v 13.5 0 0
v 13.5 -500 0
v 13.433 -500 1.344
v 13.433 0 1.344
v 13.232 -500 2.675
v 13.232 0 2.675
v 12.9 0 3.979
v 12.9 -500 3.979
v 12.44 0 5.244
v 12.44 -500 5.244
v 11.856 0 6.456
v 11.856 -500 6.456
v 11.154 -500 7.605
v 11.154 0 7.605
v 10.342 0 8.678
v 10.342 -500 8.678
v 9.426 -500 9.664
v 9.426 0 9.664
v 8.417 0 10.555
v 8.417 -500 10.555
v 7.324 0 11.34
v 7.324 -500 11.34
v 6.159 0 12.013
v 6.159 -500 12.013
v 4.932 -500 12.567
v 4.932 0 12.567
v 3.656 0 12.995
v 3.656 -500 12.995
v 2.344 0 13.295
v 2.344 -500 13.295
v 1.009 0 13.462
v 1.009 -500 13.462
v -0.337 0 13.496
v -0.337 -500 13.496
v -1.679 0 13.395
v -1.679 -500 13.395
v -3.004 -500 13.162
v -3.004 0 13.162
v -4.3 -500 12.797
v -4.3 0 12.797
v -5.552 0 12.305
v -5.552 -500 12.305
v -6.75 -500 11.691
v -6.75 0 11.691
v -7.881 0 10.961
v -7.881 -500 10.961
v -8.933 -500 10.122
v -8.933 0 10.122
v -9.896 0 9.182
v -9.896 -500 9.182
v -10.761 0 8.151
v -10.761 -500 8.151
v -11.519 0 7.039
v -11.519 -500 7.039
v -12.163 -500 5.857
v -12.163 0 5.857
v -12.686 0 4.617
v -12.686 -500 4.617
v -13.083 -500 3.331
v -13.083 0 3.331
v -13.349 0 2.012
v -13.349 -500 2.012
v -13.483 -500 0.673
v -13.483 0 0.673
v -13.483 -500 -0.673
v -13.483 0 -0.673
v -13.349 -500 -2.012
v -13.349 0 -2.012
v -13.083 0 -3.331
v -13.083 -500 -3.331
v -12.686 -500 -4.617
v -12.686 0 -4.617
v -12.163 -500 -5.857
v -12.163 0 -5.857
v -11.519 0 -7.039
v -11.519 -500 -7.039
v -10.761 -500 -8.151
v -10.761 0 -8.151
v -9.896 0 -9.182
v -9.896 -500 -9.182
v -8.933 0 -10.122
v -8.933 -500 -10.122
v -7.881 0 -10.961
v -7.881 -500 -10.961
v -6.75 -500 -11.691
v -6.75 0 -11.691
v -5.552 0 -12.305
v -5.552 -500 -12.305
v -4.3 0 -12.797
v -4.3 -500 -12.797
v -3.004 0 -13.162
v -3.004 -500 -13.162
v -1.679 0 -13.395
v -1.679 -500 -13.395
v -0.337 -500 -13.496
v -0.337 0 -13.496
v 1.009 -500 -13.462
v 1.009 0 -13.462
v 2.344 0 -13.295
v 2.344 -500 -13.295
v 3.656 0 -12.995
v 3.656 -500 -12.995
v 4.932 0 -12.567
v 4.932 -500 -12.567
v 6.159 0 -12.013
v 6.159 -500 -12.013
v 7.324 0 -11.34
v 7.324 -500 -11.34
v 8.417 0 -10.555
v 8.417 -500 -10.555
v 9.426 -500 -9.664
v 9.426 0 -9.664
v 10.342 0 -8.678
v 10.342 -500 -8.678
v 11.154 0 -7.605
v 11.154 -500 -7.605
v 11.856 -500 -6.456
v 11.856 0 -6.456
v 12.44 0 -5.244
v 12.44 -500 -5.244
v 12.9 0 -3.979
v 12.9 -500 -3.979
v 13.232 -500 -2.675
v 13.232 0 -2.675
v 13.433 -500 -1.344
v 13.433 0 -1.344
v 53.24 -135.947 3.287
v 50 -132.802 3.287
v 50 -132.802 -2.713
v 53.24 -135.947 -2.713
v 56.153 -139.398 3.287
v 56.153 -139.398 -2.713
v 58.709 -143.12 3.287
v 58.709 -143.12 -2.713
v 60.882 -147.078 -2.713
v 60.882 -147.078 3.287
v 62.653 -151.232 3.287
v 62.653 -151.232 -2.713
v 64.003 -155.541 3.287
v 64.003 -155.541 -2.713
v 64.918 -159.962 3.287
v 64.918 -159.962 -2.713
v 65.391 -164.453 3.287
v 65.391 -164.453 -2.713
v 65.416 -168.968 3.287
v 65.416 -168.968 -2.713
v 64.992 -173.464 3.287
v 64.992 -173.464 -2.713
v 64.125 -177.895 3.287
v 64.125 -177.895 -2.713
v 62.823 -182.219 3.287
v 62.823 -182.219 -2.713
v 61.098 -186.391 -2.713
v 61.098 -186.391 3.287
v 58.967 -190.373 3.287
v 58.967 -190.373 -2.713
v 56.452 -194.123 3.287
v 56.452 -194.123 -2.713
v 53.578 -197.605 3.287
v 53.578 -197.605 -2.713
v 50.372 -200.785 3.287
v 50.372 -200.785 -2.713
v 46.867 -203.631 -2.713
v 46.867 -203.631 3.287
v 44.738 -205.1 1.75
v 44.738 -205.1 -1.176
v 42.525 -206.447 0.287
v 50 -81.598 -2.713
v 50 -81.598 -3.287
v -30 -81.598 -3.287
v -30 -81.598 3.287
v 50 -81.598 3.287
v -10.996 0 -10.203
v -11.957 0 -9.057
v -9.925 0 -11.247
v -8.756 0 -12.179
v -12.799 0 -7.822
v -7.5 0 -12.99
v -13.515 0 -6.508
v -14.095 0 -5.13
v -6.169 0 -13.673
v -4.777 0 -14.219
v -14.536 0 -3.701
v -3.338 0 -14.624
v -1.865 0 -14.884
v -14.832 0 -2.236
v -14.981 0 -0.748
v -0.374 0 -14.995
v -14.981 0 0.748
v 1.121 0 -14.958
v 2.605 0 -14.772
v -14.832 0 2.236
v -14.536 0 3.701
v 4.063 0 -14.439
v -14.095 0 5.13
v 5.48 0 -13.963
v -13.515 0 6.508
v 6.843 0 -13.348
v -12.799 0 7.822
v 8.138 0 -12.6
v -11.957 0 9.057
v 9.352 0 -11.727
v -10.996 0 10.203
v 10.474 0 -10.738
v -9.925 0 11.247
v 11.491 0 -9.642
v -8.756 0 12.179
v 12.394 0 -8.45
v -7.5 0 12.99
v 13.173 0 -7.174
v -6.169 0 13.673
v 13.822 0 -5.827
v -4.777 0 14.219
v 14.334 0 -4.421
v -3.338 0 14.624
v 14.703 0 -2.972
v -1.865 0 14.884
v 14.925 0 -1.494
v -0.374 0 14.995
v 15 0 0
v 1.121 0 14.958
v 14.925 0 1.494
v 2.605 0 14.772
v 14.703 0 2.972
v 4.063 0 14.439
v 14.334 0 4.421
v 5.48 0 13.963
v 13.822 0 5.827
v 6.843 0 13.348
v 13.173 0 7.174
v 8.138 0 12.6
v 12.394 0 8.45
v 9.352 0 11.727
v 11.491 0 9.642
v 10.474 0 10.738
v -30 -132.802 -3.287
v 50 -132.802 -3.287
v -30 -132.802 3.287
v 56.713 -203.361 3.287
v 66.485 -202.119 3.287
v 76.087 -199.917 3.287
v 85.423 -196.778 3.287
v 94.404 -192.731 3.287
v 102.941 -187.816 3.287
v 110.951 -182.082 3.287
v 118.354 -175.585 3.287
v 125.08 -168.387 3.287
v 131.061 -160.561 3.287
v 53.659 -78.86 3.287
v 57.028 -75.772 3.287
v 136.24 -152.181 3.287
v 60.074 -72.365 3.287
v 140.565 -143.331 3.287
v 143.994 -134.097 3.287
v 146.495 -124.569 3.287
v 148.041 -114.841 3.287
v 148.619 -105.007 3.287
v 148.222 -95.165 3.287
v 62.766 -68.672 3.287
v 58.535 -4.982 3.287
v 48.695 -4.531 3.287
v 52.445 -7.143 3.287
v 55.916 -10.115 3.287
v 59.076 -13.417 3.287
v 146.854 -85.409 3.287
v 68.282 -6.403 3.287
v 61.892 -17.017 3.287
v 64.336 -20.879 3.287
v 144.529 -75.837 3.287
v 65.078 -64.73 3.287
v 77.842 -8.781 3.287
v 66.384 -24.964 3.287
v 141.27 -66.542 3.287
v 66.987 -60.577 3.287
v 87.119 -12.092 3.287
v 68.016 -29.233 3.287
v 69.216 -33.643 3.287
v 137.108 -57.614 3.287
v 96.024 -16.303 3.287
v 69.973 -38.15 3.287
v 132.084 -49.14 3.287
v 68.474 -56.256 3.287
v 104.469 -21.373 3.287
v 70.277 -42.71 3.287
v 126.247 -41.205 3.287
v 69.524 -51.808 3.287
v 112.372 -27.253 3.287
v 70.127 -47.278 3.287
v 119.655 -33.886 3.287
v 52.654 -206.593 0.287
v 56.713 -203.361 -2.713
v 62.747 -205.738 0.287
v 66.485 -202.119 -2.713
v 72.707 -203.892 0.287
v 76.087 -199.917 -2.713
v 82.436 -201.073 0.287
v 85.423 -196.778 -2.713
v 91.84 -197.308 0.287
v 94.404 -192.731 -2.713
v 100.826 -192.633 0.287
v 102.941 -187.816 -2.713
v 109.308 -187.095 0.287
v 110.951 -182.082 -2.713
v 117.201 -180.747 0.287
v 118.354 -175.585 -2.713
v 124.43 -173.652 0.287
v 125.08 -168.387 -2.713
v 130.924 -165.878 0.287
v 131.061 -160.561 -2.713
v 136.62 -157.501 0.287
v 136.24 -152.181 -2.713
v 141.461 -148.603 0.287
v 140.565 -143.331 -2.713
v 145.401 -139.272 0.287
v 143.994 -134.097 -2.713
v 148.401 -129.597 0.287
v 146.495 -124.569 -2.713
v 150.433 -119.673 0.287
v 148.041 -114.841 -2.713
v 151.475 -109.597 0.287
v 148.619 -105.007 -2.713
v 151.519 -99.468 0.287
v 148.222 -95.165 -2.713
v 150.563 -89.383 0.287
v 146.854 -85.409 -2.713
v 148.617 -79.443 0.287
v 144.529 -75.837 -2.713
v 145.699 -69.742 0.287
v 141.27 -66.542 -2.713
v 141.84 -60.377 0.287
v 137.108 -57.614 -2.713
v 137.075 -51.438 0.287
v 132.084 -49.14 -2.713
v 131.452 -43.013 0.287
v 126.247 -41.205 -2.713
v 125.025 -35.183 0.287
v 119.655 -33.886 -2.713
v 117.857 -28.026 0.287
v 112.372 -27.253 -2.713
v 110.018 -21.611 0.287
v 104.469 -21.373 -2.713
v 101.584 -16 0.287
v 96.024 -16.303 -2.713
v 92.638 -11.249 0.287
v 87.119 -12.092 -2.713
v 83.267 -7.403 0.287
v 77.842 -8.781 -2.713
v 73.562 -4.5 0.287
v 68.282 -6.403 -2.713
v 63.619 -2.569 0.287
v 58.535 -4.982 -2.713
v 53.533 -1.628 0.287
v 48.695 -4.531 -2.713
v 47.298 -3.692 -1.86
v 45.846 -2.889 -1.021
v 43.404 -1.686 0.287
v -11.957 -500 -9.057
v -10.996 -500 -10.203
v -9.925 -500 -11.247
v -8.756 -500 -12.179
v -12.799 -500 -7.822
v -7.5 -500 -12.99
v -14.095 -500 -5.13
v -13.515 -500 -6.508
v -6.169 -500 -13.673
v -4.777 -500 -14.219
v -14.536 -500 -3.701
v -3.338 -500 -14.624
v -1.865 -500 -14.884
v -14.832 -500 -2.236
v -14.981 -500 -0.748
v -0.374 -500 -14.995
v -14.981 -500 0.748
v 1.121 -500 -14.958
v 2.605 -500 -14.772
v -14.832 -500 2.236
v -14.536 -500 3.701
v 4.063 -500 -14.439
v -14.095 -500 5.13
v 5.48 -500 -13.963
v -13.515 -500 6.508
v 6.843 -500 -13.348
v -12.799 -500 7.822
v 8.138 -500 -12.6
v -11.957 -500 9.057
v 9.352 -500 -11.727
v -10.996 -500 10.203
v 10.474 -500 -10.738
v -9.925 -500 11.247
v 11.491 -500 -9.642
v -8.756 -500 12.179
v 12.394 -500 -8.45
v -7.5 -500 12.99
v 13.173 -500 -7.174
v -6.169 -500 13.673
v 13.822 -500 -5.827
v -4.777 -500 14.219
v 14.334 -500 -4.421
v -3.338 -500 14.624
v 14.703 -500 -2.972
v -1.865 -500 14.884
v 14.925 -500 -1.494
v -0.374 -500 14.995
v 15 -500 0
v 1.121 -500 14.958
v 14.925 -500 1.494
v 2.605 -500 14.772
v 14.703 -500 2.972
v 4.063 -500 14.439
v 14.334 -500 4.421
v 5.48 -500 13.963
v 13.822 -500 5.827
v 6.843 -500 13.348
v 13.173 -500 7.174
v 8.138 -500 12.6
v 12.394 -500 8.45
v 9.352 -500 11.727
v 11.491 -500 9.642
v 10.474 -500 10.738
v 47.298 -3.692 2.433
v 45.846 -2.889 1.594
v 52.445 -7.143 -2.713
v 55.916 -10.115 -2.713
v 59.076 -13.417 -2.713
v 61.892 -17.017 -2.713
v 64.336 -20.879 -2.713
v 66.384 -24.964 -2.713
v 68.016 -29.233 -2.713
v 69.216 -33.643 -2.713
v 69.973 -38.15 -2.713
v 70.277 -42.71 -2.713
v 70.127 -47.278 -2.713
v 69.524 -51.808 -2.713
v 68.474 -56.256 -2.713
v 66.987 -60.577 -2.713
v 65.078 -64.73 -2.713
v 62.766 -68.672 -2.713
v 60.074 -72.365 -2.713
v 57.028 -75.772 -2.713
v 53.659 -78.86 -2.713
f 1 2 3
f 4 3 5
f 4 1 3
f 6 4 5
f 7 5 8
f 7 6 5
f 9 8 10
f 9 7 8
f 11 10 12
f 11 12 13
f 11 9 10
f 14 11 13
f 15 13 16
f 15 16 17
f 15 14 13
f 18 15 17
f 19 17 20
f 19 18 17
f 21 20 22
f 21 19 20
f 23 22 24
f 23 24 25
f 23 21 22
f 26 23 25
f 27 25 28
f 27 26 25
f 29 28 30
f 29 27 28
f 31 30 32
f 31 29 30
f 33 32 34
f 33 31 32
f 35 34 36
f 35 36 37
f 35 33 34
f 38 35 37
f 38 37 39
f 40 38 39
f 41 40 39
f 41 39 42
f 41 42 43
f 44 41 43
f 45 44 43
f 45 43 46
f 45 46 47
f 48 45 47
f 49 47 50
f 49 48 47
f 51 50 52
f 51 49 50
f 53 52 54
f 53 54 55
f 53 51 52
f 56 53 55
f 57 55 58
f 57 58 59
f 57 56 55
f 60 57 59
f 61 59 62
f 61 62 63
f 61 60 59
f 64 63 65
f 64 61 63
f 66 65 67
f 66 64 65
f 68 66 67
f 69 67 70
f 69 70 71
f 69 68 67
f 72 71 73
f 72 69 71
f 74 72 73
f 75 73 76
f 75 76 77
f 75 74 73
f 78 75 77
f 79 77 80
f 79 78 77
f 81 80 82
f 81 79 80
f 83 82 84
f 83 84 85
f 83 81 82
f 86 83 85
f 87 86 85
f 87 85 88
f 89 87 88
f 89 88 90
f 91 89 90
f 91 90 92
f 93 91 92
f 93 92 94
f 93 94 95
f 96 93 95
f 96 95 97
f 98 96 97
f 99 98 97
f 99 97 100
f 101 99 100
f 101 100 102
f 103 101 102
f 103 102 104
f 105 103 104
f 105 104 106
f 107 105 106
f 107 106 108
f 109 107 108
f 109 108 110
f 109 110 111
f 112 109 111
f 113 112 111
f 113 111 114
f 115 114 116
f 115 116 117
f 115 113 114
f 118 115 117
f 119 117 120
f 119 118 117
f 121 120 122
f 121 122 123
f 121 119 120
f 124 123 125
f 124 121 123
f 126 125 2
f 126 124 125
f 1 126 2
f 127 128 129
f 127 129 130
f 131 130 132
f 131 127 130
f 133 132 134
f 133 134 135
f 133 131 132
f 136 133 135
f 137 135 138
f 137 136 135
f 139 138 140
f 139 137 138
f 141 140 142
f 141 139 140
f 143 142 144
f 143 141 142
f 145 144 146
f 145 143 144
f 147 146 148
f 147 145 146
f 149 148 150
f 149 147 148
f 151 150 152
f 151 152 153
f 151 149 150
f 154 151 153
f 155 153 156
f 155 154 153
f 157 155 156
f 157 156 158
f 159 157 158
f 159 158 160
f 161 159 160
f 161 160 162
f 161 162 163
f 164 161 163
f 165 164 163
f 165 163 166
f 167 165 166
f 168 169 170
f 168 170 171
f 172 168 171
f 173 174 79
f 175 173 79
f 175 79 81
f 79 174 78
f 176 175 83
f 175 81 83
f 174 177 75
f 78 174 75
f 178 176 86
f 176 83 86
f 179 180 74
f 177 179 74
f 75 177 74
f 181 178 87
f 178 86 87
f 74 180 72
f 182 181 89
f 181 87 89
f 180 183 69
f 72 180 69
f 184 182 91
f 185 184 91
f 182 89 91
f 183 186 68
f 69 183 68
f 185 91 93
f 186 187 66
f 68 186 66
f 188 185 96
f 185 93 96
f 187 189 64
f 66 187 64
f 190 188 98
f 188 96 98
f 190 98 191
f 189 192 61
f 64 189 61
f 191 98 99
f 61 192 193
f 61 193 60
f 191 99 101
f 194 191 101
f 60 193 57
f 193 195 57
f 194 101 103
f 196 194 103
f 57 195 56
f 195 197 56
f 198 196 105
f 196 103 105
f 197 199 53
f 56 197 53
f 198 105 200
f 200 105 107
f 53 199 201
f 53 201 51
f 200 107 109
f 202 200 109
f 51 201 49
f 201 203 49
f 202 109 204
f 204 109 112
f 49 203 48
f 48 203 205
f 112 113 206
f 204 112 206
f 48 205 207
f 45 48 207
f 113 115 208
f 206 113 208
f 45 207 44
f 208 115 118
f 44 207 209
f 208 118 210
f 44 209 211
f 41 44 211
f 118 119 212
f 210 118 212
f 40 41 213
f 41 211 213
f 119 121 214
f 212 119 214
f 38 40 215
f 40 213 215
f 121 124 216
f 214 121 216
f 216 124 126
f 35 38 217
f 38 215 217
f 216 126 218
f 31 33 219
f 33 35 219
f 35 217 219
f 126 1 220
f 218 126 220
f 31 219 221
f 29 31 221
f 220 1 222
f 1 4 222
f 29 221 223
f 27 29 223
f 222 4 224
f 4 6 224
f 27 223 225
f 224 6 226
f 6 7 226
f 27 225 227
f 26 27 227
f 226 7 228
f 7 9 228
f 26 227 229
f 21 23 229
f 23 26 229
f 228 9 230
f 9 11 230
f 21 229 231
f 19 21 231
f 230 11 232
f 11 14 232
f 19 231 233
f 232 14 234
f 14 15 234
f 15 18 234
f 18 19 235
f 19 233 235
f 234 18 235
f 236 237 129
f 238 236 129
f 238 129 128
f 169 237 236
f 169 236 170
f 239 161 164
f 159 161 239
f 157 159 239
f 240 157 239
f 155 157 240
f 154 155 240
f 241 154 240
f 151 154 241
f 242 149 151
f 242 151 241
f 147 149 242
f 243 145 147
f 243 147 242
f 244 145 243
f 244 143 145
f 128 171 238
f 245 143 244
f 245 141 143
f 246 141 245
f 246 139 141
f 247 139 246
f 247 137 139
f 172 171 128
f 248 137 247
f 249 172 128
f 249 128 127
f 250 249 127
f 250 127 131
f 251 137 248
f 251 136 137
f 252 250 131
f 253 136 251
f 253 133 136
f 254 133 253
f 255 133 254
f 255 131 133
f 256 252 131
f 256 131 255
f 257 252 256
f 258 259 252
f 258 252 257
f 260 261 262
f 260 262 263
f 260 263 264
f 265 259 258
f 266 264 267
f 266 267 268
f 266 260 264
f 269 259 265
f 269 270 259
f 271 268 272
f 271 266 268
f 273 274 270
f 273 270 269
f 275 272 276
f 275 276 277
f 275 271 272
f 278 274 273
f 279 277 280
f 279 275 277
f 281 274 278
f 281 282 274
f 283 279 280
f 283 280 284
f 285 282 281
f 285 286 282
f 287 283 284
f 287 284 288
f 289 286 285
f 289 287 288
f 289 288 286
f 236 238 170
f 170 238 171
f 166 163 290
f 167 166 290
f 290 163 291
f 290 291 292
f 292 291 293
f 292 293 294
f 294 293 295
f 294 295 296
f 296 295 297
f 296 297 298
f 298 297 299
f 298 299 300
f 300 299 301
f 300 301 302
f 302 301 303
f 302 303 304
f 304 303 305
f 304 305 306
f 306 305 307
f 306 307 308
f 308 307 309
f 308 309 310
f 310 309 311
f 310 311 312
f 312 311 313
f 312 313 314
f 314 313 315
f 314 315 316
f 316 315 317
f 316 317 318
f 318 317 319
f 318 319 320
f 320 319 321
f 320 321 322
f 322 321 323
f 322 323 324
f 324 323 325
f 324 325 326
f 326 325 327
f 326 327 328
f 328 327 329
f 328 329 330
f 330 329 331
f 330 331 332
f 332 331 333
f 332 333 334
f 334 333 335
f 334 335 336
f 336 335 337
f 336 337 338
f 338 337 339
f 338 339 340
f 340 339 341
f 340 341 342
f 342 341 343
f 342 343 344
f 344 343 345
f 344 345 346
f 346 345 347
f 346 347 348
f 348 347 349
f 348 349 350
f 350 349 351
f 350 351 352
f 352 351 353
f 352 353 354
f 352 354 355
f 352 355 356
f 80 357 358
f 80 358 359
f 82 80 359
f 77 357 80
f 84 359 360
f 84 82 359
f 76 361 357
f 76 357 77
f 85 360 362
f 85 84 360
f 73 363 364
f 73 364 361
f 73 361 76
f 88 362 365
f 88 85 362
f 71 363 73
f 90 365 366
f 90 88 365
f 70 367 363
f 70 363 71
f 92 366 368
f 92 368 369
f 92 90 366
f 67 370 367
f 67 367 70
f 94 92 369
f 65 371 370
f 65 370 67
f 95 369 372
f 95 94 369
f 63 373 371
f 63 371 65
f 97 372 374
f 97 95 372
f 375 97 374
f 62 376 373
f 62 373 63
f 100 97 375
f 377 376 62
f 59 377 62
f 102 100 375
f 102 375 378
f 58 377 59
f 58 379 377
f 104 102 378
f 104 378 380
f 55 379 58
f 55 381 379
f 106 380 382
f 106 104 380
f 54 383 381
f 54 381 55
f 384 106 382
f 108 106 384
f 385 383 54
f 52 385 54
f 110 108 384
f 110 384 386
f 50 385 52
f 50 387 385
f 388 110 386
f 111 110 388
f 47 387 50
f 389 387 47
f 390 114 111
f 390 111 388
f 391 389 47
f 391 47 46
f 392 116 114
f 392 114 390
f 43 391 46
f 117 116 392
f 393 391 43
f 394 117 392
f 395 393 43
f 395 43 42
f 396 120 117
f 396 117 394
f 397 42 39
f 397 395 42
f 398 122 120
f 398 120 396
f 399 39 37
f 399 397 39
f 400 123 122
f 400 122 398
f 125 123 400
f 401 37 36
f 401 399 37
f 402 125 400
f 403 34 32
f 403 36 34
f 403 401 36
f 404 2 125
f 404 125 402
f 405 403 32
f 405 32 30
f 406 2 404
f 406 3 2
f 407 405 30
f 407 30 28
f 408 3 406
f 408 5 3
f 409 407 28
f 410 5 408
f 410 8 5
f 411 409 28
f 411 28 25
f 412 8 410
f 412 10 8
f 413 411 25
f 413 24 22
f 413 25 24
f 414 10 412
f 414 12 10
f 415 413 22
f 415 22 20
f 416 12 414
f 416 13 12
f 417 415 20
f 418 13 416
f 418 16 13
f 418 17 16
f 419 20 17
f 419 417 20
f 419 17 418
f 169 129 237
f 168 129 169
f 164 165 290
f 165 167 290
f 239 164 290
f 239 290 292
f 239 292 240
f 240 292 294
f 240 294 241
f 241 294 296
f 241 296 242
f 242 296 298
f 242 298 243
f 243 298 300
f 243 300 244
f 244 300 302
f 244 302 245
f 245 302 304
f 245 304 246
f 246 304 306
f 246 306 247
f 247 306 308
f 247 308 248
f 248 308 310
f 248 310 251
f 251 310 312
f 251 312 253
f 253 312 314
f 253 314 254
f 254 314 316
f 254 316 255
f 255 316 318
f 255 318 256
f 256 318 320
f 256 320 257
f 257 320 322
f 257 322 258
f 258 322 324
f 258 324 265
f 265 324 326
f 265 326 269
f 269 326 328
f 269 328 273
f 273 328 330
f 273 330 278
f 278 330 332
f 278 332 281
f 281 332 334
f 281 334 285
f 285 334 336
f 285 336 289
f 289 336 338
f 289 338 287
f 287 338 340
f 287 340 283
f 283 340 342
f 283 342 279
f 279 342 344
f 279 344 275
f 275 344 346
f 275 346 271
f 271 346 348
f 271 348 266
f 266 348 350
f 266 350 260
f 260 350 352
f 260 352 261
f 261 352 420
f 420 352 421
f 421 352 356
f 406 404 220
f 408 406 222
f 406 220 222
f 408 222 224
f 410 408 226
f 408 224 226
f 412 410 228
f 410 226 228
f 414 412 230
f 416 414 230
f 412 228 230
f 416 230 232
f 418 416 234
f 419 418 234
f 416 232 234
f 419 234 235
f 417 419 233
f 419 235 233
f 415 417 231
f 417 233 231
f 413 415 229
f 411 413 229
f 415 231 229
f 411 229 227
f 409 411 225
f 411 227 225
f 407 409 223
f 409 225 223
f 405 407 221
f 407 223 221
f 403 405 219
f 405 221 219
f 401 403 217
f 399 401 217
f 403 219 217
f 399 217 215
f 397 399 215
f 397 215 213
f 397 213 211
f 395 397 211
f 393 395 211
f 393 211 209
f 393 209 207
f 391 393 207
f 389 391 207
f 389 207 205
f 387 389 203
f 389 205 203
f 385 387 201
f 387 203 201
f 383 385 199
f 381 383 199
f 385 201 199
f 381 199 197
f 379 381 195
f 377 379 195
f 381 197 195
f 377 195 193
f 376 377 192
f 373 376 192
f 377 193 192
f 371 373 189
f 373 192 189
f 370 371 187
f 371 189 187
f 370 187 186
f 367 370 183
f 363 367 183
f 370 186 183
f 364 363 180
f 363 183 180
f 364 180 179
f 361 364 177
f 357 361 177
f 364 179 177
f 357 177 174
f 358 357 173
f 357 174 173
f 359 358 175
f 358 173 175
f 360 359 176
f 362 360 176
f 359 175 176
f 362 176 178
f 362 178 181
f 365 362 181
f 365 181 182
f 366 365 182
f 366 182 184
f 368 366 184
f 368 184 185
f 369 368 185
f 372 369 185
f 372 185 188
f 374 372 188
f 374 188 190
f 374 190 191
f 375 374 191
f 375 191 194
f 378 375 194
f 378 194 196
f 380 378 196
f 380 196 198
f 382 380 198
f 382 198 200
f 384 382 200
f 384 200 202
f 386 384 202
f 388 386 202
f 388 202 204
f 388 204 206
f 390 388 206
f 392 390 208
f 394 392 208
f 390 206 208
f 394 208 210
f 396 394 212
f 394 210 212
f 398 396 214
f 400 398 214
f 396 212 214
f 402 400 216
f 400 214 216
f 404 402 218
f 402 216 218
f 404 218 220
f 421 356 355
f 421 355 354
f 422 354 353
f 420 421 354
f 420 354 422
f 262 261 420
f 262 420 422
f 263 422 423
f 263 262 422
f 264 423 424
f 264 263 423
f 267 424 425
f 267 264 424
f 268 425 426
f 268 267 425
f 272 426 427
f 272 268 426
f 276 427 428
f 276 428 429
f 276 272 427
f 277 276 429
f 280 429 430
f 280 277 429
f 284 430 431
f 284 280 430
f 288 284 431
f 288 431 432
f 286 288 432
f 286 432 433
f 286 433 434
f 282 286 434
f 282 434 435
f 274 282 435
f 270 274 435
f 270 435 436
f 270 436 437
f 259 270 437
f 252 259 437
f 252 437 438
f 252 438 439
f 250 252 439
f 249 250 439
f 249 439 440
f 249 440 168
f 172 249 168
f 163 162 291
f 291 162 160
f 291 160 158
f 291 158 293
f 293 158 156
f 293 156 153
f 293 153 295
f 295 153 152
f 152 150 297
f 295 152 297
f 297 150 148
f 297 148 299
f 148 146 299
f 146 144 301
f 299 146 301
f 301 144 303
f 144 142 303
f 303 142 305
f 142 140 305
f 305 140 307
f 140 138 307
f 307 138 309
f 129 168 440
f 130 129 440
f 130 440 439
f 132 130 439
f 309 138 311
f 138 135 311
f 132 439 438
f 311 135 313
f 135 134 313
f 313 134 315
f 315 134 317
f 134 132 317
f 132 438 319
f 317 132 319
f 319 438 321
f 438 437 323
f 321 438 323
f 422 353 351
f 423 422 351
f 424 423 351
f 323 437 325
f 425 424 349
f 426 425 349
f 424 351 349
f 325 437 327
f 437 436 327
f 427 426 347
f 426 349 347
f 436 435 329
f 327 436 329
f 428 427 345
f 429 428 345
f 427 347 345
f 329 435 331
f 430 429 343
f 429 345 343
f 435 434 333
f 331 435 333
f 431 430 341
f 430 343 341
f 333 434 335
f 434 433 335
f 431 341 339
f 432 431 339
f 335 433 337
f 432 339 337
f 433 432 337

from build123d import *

# Parameters (mm, degrees)
F0_R          = 15
F0_R_2        = 13.5
F1_DEPTH      = 500
F2_W          = 51.2043386698
F2_H          = 6.5736337565
F3_DEPTH      = 50
F3_DEPTH_BACK = 30
F5_DEPTH      = 6
F6_T2_ANGLE   = 204.9841859294
F6_T4_ANGLE   = 204.9841859294


# Not quite as in the source:
# - a fillet or chamfer that OpenCascade refuses, or shapes differently, is made with other operations: its cross-section is extruded or revolved along the edge and cut away or added


with BuildPart() as f1:
    # F0 (on Front) → F1 (new body)
    with BuildSketch(Plane.XZ):
        Circle(F0_R)
        Circle(F0_R_2, mode=Mode.SUBTRACT)
    extrude(amount=F1_DEPTH)


with BuildPart() as f3:
    # F2 (on Right) → F3 (new body, two sides)
    with BuildSketch(Plane.YZ) as f3_sk:
        with Locations((-107.200242579, 0)):
            Rectangle(F2_W, F2_H)
    extrude(amount=F3_DEPTH)
    extrude(f3_sk.sketch, amount=-F3_DEPTH_BACK)

    # F4 (on face) → F5 (join)
    with BuildSketch(Plane.XY.offset(3.2868168782)):
        with BuildLine():
            ThreePointArc((39.1590334475, 0), (69.8835121208, -37.437195382), (50, -81.5980732441))
            Line((50, -81.5980732441), (50, -132.8024119139))
            ThreePointArc((50, -132.8024119139), (64.9970619773, -173.4303852551), (39.1590334475, -208.1858217716))
            ThreePointArc((39.1590334475, -208.1858217716), (153.6228645246, -104.0929108858), (39.1590334475, 0))
        make_face()
    extrude(amount=-F5_DEPTH)

    # F6: chamfer of 5 on 2 edges, made by hand

    # F6_s1 → F6_t2 (revolve, cut)
    with BuildSketch(Plane(origin=(68.7474753005, -15.2309949436, 0), x_dir=(0, 0, 1), z_dir=(-0.9763258673, 0.2163048793, 0))):
        Polygon((2.2868168782, -195.5793924312), (-2.7131831218, -190.5793924312), (-2.7131831218, -195.5793924312), align=None)
    revolve(axis=Axis((49.0601284346, -104.0929108858, -2.7131831218), (0, 0, 1)), revolution_arc=F6_T2_ANGLE, mode=Mode.SUBTRACT)

    # F6_s3 → F6_t4 (revolve, cut)
    with BuildSketch(Plane(origin=(68.7474753005, -15.2309949436, 0), x_dir=(0, 0, 1), z_dir=(-0.9763258673, 0.2163048793, 0))):
        Polygon((3.2868168782, -190.5793924312), (-1.7131831218, -195.5793924312), (3.2868168782, -195.5793924312), align=None)
    revolve(axis=Axis((49.0601284346, -104.0929108858, 3.2868168782), (0, 0, 1)), revolution_arc=F6_T4_ANGLE, mode=Mode.SUBTRACT)


solid = Compound([f1.part, f3.part])
